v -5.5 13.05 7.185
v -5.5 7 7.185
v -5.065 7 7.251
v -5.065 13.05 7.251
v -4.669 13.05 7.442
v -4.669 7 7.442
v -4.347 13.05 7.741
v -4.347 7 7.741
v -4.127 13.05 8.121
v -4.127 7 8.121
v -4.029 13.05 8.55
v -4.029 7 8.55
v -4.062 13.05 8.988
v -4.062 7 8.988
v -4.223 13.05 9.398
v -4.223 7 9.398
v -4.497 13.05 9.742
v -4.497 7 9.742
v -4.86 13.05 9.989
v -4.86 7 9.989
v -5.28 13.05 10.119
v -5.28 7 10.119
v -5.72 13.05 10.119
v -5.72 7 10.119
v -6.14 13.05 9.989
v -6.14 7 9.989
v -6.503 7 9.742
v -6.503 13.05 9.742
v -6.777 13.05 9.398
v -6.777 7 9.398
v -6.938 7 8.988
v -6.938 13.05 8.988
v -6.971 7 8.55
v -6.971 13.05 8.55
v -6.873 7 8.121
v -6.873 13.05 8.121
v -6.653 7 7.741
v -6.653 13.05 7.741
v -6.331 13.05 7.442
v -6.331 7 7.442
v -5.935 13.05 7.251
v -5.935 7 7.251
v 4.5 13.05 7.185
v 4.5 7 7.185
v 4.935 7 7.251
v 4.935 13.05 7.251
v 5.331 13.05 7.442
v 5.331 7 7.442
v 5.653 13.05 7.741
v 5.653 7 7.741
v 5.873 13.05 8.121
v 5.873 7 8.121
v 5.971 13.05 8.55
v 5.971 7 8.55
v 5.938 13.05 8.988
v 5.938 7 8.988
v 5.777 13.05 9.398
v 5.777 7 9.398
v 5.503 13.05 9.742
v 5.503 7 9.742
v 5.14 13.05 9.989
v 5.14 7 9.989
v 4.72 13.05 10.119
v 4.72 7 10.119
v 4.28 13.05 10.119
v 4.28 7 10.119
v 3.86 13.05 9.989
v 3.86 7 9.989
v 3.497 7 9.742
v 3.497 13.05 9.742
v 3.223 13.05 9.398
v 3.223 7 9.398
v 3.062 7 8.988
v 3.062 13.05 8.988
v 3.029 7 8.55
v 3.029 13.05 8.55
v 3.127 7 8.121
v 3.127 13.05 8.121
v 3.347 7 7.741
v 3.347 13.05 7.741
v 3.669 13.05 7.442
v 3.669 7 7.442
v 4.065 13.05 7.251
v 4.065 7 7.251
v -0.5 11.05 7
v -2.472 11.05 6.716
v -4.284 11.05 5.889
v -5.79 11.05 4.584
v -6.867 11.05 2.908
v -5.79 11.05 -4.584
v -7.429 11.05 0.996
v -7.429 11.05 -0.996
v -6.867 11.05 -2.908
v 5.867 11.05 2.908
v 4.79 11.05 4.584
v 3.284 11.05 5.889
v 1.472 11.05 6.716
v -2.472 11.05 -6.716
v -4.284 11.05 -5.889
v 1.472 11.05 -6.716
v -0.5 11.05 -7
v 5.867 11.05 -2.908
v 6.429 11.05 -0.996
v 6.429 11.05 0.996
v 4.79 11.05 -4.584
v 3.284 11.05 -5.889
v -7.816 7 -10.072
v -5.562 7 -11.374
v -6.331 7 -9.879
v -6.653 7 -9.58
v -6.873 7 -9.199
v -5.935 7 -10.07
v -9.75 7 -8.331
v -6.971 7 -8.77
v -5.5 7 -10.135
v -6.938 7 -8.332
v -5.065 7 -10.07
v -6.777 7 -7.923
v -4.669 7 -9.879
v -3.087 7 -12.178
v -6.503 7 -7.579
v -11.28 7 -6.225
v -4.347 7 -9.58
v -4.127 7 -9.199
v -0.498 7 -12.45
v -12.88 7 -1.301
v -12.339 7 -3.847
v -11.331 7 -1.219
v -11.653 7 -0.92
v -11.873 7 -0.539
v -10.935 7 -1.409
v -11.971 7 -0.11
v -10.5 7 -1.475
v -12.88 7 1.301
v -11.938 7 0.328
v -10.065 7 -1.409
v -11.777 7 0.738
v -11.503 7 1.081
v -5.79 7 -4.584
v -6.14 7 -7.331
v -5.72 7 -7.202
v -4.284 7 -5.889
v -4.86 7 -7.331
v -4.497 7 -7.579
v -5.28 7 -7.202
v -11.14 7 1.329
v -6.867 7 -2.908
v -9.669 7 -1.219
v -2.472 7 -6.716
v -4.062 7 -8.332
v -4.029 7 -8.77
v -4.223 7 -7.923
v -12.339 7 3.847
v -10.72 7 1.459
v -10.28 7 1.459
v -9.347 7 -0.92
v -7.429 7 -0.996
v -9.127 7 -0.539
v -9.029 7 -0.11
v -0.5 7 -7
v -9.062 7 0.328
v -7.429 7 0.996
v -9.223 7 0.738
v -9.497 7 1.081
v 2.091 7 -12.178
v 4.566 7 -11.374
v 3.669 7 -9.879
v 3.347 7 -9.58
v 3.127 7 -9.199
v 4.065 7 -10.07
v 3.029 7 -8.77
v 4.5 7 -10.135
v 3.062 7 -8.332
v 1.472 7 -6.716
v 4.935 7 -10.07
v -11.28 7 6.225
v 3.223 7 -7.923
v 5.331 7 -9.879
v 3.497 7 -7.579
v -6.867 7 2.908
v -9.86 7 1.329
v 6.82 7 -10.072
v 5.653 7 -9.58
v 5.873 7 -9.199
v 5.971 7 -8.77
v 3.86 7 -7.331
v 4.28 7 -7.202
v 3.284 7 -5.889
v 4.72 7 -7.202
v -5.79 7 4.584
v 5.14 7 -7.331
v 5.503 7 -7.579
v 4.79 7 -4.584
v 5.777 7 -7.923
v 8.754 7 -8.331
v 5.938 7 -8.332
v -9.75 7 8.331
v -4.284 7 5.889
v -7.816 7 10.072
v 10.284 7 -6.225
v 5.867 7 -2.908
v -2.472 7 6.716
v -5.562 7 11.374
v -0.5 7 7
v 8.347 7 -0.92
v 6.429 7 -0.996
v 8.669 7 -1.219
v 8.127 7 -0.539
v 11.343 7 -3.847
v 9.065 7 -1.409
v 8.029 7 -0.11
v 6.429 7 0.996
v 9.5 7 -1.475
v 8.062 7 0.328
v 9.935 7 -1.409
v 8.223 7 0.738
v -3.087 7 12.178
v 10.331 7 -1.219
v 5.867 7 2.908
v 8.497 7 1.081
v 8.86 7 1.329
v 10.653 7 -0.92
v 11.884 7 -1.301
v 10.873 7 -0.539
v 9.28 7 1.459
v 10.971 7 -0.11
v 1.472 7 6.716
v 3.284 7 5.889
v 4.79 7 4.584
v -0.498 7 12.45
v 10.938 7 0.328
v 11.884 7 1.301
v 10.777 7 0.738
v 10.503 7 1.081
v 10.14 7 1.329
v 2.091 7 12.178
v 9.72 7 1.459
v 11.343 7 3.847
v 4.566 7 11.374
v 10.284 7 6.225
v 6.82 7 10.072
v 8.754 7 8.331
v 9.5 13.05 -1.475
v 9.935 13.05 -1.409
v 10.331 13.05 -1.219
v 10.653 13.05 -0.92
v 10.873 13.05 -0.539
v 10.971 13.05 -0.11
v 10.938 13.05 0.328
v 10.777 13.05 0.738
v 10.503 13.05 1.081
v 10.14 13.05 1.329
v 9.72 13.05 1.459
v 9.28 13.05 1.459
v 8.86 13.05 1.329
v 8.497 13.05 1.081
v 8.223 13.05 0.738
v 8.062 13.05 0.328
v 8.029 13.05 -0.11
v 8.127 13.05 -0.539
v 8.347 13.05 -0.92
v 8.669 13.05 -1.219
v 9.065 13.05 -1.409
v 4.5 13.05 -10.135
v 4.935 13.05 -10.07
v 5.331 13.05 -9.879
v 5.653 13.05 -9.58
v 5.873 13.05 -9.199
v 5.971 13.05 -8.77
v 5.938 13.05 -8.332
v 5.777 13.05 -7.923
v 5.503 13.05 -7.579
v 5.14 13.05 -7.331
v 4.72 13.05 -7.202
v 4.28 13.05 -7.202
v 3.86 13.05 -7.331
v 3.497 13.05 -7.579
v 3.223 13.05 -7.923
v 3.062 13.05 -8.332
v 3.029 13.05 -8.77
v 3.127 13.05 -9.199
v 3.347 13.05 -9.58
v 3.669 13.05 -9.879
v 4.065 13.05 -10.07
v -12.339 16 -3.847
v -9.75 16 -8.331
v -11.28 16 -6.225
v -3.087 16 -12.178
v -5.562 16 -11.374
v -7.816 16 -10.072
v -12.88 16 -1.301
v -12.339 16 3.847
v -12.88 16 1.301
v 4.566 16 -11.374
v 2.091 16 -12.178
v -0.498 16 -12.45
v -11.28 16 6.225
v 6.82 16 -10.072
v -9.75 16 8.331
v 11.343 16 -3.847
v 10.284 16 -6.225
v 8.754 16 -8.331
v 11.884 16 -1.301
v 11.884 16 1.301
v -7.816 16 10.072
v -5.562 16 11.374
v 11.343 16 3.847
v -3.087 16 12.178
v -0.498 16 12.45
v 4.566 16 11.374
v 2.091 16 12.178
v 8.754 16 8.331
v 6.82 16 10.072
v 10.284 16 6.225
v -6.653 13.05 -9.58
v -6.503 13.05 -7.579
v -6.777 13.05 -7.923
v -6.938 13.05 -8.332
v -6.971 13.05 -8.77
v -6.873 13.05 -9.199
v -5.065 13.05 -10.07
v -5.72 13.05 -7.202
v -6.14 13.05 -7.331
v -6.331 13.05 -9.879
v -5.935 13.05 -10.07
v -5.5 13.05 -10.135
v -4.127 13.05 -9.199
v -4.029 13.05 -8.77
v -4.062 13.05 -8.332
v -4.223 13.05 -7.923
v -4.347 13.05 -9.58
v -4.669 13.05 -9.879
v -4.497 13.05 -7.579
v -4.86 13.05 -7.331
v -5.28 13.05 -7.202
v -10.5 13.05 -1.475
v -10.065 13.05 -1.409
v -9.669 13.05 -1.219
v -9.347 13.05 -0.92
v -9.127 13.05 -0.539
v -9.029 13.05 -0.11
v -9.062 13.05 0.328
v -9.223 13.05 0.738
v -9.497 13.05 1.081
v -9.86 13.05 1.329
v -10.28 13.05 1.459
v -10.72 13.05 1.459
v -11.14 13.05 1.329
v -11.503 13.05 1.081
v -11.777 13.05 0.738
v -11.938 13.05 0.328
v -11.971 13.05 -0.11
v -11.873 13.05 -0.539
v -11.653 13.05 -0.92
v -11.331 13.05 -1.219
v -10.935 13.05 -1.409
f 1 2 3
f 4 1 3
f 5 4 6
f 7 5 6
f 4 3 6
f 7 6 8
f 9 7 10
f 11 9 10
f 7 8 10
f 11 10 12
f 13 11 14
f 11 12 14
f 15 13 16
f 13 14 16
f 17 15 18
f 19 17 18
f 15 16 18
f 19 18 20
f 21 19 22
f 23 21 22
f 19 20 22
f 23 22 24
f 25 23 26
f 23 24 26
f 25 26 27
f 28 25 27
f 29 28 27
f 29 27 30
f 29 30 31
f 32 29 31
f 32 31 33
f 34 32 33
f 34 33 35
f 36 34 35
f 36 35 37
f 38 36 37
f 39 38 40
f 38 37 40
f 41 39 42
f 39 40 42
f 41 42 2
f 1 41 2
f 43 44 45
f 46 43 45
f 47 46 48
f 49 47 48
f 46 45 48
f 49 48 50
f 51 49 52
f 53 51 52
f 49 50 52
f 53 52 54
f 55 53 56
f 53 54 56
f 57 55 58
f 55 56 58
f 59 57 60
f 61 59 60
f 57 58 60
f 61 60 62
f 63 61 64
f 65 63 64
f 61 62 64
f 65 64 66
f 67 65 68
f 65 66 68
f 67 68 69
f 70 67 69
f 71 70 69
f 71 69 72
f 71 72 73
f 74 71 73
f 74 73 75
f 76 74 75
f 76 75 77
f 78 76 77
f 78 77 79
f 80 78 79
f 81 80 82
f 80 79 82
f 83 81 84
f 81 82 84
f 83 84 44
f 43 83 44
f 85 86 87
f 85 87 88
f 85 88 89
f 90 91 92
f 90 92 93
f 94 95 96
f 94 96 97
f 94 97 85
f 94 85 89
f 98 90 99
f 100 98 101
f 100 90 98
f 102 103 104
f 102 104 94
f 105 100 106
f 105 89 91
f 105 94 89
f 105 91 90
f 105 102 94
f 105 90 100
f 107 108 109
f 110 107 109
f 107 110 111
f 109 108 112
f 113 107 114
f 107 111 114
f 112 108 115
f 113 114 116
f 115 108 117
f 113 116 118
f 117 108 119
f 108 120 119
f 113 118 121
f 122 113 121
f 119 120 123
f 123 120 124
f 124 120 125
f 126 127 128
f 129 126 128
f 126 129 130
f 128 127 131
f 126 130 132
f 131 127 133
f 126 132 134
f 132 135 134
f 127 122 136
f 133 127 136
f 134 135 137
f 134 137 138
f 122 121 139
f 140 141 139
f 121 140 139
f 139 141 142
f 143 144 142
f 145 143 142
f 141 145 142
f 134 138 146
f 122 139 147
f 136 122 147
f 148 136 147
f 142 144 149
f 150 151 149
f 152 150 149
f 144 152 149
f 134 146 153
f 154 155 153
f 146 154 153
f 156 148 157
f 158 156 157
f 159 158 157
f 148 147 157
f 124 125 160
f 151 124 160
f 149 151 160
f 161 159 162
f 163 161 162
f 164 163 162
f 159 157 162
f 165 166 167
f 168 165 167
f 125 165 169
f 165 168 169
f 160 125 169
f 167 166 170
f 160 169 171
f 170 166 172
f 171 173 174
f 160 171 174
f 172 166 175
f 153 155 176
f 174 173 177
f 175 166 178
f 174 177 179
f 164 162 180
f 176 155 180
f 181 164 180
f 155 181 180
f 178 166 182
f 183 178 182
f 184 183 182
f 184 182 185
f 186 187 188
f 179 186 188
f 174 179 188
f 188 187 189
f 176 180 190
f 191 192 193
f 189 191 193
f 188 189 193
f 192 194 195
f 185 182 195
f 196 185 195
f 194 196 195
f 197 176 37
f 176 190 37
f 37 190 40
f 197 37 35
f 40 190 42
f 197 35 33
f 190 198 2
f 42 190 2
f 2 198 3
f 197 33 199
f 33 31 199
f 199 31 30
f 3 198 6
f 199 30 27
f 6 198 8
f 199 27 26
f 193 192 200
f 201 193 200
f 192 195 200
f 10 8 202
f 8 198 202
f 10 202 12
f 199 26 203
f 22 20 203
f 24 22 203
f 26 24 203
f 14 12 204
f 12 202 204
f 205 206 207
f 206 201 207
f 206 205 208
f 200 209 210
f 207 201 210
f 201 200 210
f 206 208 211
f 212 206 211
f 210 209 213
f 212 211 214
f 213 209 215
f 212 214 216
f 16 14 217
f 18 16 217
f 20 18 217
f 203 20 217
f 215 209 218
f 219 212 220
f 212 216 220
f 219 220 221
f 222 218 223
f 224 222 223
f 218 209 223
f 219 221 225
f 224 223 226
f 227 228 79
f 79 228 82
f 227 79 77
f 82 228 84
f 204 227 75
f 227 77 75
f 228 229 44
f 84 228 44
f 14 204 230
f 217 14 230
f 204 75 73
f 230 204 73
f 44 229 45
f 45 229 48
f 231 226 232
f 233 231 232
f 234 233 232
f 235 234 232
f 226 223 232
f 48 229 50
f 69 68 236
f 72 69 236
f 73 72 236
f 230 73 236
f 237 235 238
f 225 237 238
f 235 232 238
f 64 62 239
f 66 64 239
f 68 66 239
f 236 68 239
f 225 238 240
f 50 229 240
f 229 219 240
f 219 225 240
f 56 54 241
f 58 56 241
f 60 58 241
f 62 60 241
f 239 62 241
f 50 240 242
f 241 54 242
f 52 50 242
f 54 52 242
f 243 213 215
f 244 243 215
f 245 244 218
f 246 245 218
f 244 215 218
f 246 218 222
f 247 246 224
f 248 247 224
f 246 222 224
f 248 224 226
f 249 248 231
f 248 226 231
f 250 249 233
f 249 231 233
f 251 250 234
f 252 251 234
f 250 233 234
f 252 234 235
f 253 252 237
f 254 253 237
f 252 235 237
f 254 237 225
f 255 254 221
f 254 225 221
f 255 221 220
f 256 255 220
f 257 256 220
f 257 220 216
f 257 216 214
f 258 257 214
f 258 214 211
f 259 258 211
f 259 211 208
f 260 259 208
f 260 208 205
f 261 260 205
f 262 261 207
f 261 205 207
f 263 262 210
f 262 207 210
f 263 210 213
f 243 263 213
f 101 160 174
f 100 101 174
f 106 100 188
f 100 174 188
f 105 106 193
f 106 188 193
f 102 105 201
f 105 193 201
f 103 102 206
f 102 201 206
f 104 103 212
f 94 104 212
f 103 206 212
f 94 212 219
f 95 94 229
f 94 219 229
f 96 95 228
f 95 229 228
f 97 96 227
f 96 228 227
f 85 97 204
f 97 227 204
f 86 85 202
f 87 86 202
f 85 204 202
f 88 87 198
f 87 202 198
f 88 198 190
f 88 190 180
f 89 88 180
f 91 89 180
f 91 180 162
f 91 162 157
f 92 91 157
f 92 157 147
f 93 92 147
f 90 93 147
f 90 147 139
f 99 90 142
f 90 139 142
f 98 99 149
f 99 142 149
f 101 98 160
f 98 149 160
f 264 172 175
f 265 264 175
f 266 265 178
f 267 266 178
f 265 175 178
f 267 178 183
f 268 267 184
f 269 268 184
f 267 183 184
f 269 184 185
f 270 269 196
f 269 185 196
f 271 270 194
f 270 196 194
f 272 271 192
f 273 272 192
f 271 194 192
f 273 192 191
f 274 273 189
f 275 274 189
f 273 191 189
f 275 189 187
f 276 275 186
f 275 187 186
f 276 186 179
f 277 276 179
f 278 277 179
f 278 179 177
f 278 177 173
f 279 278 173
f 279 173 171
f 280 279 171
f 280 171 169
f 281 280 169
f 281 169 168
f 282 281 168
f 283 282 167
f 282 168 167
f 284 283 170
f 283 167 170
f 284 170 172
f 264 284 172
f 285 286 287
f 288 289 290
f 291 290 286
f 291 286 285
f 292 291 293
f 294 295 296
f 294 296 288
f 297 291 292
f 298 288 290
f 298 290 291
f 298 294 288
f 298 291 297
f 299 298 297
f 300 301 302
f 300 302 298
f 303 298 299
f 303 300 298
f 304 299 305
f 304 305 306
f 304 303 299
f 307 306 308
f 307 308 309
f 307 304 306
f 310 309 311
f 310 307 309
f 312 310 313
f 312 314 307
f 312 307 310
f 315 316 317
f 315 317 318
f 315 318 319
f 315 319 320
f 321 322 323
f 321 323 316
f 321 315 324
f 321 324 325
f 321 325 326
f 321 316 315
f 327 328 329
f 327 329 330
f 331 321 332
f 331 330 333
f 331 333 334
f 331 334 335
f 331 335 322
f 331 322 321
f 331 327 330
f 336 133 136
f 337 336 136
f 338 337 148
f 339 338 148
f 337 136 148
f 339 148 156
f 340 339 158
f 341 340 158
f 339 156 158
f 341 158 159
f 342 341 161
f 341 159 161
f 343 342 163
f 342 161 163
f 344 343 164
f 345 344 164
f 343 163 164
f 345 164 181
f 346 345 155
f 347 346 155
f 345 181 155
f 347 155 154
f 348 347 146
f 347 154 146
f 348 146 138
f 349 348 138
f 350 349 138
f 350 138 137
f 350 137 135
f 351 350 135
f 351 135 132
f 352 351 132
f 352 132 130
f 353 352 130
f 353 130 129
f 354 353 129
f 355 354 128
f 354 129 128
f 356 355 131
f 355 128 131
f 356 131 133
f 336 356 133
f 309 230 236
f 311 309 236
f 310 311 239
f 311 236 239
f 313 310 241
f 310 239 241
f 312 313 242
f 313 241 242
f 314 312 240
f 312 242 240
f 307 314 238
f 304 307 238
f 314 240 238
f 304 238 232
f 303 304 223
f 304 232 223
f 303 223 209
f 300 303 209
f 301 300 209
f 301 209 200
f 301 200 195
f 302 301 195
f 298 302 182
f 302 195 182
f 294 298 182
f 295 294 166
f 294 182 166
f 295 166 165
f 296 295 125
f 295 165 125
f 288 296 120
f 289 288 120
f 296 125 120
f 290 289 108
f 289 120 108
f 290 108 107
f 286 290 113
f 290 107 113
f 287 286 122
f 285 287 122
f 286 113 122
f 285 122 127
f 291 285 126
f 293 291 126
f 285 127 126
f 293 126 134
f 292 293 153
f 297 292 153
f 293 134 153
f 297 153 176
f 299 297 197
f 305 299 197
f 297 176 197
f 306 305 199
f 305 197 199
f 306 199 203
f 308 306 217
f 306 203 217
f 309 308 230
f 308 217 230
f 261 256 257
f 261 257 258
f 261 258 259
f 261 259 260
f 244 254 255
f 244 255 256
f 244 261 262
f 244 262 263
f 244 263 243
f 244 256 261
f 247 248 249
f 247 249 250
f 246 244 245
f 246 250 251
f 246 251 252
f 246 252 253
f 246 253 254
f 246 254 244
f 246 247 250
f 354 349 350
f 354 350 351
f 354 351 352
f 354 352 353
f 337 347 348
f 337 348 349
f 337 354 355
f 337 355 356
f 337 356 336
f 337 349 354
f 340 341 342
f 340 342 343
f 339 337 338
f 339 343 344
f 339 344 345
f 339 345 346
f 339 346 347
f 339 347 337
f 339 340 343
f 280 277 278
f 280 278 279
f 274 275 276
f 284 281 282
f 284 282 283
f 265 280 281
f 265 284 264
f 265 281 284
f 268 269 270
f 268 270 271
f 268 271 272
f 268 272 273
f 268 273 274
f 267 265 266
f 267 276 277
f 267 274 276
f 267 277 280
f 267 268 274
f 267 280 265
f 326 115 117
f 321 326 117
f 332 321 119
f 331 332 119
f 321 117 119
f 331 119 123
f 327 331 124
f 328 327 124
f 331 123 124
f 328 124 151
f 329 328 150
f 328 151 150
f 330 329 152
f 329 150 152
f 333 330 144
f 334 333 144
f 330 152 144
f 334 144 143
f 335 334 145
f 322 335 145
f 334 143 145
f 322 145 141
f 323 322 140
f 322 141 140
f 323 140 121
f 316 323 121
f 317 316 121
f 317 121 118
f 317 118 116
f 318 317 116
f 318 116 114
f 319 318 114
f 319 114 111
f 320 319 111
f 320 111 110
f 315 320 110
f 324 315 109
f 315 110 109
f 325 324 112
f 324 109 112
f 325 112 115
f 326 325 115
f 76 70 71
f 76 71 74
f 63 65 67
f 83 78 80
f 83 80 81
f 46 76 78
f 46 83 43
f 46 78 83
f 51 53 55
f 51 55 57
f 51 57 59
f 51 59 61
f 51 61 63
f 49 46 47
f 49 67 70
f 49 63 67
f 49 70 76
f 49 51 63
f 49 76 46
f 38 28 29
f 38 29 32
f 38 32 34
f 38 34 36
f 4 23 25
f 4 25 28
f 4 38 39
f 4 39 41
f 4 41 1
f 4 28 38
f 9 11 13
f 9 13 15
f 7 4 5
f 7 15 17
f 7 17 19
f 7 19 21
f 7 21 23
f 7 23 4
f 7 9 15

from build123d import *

# Parameters (mm, degrees)
BOSS_EXTRUDE2_DEPTH      = 2
BOSS_EXTRUDE2_DEPTH_BACK = 7
SKETCH2_R                = 12.45
SKETCH3_R                = 1.475
CUT_EXTRUDE1_DEPTH       = 6.05
SKETCH4_R                = 7
CUT_EXTRUDE2_DEPTH       = 4.05


with BuildPart() as part:
    # Sketch2 → Boss-Extrude2 (new, two sides: drawn at the far end of the back side and taken through both)
    with BuildSketch(Plane(origin=(0, 14, 0), x_dir=(1, 0, 0), z_dir=(0, 1, 0)).offset(-BOSS_EXTRUDE2_DEPTH_BACK)):
        with Locations(Location((-0.498, 0, 0), (0, 0, 270))):
            Circle(SKETCH2_R)
    extrude(amount=BOSS_EXTRUDE2_DEPTH + BOSS_EXTRUDE2_DEPTH_BACK)

    # Sketch3 → Cut-Extrude1 (cut)
    with BuildSketch(Plane.XZ.offset(-7)):
        with Locations(Location((9.5, 0, 0), (0, 0, 270))):
            Circle(SKETCH3_R)
        with Locations(Location((4.5, -8.660254038, 0), (0, 0, 270))):
            Circle(SKETCH3_R)
        with Locations(Location((-5.5, -8.660254038, 0), (0, 0, 270))):
            Circle(SKETCH3_R)
        with Locations(Location((-10.5, 0, 0), (0, 0, 270))):
            Circle(SKETCH3_R)
        with Locations(Location((-5.5, 8.660254038, 0), (0, 0, 270))):
            Circle(SKETCH3_R)
        with Locations(Location((4.5, 8.660254038, 0), (0, 0, 270))):
            Circle(SKETCH3_R)
    extrude(amount=-CUT_EXTRUDE1_DEPTH, mode=Mode.SUBTRACT)

    # Sketch4 → Cut-Extrude2 (cut)
    with BuildSketch(Plane.XZ.offset(-7)):
        with Locations(Location((-0.5, 0, 0), (0, 0, 270))):
            Circle(SKETCH4_R)
    extrude(amount=-CUT_EXTRUDE2_DEPTH, mode=Mode.SUBTRACT)


solid = part.part
